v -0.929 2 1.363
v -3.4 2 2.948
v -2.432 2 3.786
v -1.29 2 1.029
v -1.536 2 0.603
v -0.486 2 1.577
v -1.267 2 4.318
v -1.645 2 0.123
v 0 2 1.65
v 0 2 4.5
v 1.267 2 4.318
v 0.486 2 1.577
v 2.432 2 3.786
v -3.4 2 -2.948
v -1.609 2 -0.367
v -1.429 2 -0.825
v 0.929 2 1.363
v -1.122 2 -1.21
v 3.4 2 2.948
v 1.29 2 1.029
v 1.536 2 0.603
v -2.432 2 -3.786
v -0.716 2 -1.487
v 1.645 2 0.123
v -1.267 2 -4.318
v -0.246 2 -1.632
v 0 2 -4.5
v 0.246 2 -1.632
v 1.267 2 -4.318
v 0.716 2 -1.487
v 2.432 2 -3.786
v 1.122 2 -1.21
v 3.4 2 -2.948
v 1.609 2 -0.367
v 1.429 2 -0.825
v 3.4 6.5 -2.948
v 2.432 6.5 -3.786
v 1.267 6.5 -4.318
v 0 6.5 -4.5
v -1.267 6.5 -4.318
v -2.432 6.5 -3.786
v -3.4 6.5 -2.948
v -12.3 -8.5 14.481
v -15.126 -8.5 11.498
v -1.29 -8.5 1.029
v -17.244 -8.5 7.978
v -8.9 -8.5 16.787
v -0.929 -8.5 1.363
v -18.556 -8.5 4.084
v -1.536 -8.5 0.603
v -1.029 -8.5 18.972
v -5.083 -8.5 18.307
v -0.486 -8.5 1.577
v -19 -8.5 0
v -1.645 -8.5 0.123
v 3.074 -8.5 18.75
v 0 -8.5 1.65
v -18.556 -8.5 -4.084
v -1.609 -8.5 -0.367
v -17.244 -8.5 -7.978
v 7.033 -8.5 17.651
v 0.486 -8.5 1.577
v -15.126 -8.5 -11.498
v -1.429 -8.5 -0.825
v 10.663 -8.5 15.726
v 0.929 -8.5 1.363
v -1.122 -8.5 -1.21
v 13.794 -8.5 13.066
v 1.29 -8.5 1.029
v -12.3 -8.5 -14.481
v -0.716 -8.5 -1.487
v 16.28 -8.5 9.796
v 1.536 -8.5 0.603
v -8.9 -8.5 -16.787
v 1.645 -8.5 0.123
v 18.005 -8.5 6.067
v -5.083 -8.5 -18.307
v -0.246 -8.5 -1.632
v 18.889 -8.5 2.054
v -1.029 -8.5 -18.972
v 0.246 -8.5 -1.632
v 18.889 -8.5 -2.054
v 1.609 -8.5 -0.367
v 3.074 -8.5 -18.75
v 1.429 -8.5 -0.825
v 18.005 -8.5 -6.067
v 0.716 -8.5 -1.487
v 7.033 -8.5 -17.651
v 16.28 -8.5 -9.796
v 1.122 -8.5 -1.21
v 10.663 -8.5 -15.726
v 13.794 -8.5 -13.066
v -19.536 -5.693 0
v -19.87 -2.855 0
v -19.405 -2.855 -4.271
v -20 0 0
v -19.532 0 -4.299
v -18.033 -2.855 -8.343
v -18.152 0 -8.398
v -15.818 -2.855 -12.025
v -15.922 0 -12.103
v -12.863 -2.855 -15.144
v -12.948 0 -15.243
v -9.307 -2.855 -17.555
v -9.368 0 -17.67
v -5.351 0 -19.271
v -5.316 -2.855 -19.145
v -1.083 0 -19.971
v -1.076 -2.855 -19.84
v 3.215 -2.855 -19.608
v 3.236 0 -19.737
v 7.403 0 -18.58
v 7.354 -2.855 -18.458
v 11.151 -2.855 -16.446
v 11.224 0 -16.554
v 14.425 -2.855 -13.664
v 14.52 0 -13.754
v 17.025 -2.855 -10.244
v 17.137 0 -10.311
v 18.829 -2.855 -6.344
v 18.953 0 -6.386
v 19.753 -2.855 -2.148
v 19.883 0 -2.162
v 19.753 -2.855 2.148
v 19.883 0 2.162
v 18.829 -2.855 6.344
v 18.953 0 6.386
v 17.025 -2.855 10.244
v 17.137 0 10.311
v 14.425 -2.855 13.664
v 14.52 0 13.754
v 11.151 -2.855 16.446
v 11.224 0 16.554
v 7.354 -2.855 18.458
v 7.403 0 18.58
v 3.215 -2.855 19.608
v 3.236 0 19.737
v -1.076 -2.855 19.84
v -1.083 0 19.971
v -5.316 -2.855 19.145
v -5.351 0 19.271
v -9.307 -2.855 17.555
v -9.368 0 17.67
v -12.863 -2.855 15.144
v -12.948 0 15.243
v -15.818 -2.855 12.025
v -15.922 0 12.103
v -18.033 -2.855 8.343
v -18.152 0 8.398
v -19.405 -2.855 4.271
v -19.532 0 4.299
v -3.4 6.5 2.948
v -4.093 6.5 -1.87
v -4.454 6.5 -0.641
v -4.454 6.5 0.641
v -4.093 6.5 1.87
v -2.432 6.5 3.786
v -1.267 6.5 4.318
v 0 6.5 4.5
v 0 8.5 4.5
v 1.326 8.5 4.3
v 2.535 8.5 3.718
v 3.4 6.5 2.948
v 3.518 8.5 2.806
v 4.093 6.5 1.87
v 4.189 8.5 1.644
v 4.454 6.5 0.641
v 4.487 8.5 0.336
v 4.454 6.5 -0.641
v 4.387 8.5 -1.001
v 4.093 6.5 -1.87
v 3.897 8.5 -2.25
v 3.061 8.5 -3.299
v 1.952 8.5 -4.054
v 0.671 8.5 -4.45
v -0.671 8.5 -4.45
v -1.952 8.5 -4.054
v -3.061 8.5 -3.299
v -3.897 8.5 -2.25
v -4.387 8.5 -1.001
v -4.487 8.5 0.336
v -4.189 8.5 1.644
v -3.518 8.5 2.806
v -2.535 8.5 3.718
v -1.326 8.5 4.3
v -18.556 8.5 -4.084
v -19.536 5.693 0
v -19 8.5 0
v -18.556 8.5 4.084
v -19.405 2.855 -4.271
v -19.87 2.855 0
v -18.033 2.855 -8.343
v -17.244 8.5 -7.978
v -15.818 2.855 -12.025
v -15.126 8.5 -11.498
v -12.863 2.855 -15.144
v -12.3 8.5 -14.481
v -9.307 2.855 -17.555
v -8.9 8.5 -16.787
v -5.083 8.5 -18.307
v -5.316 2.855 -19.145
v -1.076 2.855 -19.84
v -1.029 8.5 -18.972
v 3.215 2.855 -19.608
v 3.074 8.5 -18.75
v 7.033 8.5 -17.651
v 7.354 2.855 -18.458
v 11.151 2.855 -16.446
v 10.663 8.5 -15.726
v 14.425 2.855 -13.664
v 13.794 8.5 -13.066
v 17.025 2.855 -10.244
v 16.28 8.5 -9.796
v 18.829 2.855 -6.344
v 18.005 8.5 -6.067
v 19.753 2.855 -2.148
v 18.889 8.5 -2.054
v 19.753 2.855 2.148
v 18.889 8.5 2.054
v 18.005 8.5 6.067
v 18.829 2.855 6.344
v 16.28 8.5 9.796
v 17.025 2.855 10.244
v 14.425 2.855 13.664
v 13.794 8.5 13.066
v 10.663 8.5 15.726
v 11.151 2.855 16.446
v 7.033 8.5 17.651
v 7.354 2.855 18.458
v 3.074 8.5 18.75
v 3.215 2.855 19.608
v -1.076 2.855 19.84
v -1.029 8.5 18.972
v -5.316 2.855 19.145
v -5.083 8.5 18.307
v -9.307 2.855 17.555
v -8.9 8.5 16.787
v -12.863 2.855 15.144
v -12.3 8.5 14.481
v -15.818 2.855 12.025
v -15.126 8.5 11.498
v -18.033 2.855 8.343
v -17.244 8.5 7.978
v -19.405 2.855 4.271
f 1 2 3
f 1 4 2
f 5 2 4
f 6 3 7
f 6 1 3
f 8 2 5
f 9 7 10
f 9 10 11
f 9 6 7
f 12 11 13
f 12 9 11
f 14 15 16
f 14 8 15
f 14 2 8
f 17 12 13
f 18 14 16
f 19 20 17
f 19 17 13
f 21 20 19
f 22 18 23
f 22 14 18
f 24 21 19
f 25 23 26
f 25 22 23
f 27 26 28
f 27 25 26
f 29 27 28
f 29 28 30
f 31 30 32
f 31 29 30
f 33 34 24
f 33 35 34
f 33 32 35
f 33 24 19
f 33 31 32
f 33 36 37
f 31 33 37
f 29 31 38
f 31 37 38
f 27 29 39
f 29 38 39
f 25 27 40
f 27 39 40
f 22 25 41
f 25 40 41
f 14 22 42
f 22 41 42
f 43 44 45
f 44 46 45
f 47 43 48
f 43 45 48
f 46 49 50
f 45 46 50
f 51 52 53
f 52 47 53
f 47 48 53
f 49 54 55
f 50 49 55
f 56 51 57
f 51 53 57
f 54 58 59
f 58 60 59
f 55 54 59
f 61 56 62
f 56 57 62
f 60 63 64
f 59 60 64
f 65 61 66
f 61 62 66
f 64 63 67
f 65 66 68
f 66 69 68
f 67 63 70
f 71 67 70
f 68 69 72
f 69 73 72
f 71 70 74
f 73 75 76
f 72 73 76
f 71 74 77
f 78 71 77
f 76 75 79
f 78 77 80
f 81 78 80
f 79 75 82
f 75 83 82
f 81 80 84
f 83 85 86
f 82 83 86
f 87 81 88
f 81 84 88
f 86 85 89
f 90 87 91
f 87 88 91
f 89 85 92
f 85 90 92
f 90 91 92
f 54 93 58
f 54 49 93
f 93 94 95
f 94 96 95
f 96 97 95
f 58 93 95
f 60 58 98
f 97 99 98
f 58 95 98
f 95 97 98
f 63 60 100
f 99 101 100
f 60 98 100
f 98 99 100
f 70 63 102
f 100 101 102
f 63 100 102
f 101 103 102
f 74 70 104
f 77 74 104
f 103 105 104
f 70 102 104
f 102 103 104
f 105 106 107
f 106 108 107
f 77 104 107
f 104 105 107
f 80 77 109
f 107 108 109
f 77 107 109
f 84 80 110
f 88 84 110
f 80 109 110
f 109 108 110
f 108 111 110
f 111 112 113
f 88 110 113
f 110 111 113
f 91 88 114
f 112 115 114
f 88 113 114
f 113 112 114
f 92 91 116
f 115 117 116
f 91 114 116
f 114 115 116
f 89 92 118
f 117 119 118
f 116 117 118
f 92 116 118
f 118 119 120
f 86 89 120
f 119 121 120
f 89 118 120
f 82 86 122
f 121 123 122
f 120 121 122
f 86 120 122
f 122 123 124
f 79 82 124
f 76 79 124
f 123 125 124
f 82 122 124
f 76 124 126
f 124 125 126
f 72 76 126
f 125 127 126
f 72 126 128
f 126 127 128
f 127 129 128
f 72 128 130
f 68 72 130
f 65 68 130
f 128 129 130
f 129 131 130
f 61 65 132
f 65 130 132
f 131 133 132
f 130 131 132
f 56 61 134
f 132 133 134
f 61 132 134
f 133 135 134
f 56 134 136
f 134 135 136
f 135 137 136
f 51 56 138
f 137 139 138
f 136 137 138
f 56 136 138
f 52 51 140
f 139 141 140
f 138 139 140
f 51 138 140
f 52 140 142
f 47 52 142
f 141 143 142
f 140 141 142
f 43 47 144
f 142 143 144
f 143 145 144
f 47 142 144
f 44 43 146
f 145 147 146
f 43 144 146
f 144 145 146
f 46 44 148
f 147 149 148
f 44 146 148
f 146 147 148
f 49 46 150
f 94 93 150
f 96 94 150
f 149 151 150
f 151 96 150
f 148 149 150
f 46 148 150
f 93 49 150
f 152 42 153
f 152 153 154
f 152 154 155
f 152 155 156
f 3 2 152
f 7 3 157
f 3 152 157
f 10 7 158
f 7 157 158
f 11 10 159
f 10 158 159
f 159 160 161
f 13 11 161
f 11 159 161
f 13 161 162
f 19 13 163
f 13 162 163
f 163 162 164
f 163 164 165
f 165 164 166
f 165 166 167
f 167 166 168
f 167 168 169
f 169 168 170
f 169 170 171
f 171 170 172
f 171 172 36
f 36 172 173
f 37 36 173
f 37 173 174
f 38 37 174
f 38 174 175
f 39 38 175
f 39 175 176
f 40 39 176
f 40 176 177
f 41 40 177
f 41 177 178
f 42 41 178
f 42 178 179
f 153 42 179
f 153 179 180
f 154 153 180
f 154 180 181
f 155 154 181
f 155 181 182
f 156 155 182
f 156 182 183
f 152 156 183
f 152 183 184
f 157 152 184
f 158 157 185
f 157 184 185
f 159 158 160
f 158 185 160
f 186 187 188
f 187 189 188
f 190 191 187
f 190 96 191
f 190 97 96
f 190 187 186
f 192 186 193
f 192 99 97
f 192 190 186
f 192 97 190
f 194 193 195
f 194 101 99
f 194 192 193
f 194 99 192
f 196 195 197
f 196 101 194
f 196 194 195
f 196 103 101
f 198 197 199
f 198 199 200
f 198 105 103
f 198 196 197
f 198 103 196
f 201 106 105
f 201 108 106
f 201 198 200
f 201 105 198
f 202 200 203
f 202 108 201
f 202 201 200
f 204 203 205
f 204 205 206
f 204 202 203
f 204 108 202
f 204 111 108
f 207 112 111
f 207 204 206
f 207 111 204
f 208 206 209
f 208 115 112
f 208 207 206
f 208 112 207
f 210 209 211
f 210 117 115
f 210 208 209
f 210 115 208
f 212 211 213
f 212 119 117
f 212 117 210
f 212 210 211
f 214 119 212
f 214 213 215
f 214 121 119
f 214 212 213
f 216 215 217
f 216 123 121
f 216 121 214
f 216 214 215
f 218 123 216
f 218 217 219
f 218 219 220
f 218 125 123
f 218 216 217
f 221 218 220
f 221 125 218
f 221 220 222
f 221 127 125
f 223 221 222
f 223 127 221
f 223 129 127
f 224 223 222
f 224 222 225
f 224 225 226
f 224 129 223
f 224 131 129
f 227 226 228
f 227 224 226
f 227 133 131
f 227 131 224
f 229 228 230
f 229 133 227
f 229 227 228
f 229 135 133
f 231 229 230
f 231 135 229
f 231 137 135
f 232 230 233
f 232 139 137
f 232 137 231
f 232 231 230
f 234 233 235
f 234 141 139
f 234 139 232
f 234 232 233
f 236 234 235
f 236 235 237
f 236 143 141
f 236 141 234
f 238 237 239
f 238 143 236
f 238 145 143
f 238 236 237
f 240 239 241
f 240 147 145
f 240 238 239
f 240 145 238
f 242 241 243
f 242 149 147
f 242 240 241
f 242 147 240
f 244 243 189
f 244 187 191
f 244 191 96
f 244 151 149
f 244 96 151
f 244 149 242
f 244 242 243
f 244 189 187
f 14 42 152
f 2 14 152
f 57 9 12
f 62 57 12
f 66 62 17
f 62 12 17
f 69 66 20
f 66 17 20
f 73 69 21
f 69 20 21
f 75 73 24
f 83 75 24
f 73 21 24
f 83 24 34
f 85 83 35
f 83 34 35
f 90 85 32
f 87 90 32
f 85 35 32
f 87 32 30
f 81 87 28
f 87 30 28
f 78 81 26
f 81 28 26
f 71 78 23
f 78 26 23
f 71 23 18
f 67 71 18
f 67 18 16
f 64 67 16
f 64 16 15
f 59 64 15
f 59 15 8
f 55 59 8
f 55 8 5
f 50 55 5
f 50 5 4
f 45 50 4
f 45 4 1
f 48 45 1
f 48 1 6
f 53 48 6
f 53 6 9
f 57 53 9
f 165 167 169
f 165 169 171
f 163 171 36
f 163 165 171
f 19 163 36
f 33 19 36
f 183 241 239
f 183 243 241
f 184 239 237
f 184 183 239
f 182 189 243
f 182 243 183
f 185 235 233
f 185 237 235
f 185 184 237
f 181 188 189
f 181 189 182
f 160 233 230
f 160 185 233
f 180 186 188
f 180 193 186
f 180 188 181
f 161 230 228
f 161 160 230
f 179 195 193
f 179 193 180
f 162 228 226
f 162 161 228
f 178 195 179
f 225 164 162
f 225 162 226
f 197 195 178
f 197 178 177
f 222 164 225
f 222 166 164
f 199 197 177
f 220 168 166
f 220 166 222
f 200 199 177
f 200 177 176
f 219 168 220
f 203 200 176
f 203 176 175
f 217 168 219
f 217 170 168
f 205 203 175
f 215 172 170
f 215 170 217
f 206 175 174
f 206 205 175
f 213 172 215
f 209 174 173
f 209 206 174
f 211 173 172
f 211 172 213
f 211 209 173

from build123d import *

# Parameters (mm, degrees)
SKETCH2_R          = 4.5
CUT_EXTRUDE1_DEPTH = 2
SKETCH2_3_R        = 1.65
CUT_EXTRUDE2_DEPTH = 34.000000173
CUT_EXTRUDE3_START = -2
SKETCH2_5_R        = 1.65
CUT_EXTRUDE3_DEPTH = 4.5


with BuildPart() as part:
    # Sketch1 → Revolve1 (revolve)
    with BuildSketch(Plane.XY, mode=Mode.PRIVATE) as revolve1_sk:
        with BuildLine():
            Line((0, -8.5), (19, -8.5))
            ThreePointArc((19, -8.5), (19.72799262, -4.276822661), (20, 0))
            Line((20, 0), (0, 0))
            Line((0, 0), (0, -8.5))
        make_face()
    revolve1 = revolve(revolve1_sk.sketch.rotate(Axis((0, 0, 0), (0, -1, 0)), 180), axis=Axis((0, 0, 0), (0, -1, 0)))

    # Mirror1: Revolve1 across plane
    add(revolve1.mirror(Plane.ZX))

    # Sketch2 → Cut-Extrude1 (cut)
    with BuildSketch(Plane(origin=(0, 8.5, 0), x_dir=(1, 0, 0), z_dir=(0, 1, 0))):
        with Locations(Location((0, 0, 0), (0, 0, 270))):
            Circle(SKETCH2_R)
    extrude(amount=-CUT_EXTRUDE1_DEPTH, mode=Mode.SUBTRACT)

    # Sketch2<3> → Cut-Extrude2 (cut, through all)
    with BuildSketch(Plane(origin=(0, 8.5, 0), x_dir=(1, 0, 0), z_dir=(0, 1, 0))):
        with Locations(Location((0, 0, 0), (0, 0, 270))):
            Circle(SKETCH2_3_R)
    extrude(amount=-CUT_EXTRUDE2_DEPTH, mode=Mode.SUBTRACT)

    # Sketch2<5> → Cut-Extrude3 (cut)
    with BuildSketch(Plane(origin=(0, 8.5, 0), x_dir=(1, 0, 0), z_dir=(0, 1, 0)).offset(CUT_EXTRUDE3_START)):
        with BuildLine():
            ThreePointArc((-3.4, -2.947880595), (0, -4.5), (3.4, -2.947880595))
            Line((3.4, -2.947880595), (3.4, 2.947880595))
            ThreePointArc((3.4, 2.947880595), (0, 4.5), (-3.4, 2.947880595))
            Line((-3.4, 2.947880595), (-3.4, -2.947880595))
        make_face()
        with Locations(Location((0, 0, 0), (0, 0, 270))):
            Circle(SKETCH2_5_R, mode=Mode.SUBTRACT)
    extrude(amount=-CUT_EXTRUDE3_DEPTH, mode=Mode.SUBTRACT)


solid = part.part
